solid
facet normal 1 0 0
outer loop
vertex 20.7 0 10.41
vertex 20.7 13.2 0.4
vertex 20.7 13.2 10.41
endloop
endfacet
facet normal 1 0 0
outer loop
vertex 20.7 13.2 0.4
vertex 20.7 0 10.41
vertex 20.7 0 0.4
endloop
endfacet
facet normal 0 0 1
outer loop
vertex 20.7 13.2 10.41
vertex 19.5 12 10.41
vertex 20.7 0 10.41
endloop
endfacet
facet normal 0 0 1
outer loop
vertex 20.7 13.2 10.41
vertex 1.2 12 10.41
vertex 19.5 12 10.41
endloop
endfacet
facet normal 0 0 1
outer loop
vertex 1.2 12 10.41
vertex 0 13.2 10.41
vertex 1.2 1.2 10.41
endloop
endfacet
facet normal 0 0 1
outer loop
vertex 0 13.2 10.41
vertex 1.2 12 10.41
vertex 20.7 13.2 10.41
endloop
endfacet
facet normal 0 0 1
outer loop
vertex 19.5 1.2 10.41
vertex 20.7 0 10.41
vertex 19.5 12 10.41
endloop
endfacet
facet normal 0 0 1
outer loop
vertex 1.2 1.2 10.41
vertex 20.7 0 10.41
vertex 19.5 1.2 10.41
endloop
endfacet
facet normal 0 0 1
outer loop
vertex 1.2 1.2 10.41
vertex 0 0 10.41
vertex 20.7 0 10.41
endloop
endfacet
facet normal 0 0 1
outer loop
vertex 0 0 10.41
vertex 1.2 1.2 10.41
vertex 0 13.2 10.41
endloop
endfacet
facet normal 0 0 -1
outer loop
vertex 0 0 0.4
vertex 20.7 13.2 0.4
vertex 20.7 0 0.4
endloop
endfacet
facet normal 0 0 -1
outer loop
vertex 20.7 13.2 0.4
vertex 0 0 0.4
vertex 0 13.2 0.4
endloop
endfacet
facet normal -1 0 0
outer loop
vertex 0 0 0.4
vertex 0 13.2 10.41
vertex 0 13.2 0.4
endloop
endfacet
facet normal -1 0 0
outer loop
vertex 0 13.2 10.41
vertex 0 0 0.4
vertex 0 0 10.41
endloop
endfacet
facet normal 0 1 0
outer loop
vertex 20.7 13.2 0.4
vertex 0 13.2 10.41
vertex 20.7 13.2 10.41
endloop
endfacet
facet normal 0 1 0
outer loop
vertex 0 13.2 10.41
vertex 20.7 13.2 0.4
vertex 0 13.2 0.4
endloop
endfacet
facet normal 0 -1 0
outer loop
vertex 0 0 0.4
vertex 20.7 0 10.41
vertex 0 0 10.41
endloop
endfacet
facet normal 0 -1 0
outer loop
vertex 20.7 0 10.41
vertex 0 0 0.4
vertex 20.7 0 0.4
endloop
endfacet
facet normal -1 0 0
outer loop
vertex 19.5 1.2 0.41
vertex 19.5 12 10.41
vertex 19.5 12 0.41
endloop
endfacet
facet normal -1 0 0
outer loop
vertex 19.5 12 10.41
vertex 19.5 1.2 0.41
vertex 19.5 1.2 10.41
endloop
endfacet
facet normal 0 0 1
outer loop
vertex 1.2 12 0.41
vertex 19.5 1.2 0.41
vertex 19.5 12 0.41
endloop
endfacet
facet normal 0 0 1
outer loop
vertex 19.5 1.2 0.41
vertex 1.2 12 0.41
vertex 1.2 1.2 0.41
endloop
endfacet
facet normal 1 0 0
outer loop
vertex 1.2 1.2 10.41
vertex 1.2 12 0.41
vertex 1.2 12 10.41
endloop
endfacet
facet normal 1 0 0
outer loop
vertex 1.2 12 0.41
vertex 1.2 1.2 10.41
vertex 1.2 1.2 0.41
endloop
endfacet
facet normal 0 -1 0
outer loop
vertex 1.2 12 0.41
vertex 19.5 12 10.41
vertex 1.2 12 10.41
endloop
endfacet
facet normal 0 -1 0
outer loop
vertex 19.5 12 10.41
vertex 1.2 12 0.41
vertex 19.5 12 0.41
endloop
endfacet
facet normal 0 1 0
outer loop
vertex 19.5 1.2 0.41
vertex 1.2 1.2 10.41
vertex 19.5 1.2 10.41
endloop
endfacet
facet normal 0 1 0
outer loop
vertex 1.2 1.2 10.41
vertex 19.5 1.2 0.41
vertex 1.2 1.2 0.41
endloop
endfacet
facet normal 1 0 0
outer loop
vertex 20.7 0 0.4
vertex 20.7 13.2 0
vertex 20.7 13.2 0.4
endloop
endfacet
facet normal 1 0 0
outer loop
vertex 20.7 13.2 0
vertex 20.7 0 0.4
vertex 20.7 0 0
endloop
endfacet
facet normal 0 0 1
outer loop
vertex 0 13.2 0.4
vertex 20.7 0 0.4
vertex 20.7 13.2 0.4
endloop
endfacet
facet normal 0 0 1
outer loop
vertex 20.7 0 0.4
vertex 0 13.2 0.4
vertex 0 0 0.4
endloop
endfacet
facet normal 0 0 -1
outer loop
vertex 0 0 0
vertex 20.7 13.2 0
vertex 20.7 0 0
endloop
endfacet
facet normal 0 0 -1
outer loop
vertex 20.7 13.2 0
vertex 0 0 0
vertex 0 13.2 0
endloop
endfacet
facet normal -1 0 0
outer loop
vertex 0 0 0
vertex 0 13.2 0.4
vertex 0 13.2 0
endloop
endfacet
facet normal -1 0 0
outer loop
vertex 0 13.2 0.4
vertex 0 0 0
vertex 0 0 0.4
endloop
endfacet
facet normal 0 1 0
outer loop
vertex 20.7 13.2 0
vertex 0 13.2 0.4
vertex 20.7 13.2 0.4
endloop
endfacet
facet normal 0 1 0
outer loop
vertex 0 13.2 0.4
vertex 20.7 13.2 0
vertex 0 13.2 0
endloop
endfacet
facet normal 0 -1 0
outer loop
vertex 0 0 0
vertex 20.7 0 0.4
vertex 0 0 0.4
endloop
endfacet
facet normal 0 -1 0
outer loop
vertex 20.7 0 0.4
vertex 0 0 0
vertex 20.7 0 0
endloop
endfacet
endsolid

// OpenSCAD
// file: ../../Base/Boxes.scad
// Fischertechnik Box Foundation
// Pre-designed Boxes

use <Constants.scad>

include <PlacementOptions.scad>

box190Width = 190;
box190Depth = 130;
box130Width = 130;
box130Depth = 95;
boxUsageHeight = 33.9;
boxWallThickness = 2.4;
boxBaseThickness = 1.0;
boxWebWidth = 3.0;

// getBoxWallThickness()
// Gets the wall thickness of a Fischertechnik Box

function getBoxWallThickness() = boxWallThickness;

// Gets the usable height of a fischertechnik box
function getBoxUsageHeight() = boxUsageHeight;

// Gets the thickness of the Fischertechnik box base.
function getBoxBaseThickness() = boxBaseThickness;

// Gets the width of a box web
function getBoxWebWidth() = boxWebWidth;

// Gets the usable inner space of a Box 190 as an x/y-list
function getBox190Space() = [
    box190Width - 2*getBoxWallThickness(), 
    box190Depth - 2*getBoxWallThickness() ];

// Imports the Fischertechnik empty box 130x190 mm and places it at position 0,0
// 190x130 are the outer sizes, the inner space is slightly smaller. Use getBox190Space() to get the inner sizes.
// This module needs the STL file "Fischertechnik Box 130x190.stl" in the library path.
// The box is positioned that the usable inner space is at the 0,0,0 position. The

module Box190() {
    translate([-getBoxWallThickness(),-getBoxWallThickness(),-getBoxBaseThickness()])
        import("Fischertechnik Box 130x190.stl", convexity=3);
}

// Gets the usable inner space of a Box 130 as an x/y-list
function getBox130Space() = [
    box130Width - 2*getBoxWallThickness(), 
    box130Depth - 2*getBoxWallThickness() ];

// Imports the Fischertechnik empty box 95x130 mm and places it at position 0,0
// 190x130 are the outer sizes, the inner space is slightly smaller. Use getBox190Space() to get the inner sizes.
// This module needs the STL file "Fischertechnik Box 95x130.stl" in the library path.
// The box is positioned that the usable inner space is at the 0,0,0 position. The

module Box130() {
    translate([-getBoxWallThickness(),-getBoxWallThickness(),-getBoxBaseThickness()])
        import("Fischertechnik Box 95x130.stl", convexity=3);
}

// Creates a web at the specified box walls
// corner 0 = LowerLeft, 1 = UpperLeft, 2 = UpperRight, 3 = LowerRight
// side 0 = LeftOfCorner, 1 = RightOfCorner
// distance = Distance in mm from the corner
// box = inner width and depth of the box (default: Box 190)
// webWidth = length of the web (default is 3 mms)
// webThickness = thickness of the web (default is 1 mm)

module BoxWeb(corner, side, distance, box=getBox190Space(), webWidth=getBoxWebWidth(), webThickness=1.0) {
    sink = getBoxWallThickness()/2;

    width = (corner % 2 == 0) ? 
            (side == LeftOfCorner ? webWidth : webThickness) :
            (side == LeftOfCorner ? webThickness : webWidth);

    depth = (corner % 2 == 0) ? 
            (side == RightOfCorner ? webWidth : webThickness) :
            (side == RightOfCorner ? webThickness : webWidth);
    
    xDiff = corner == LowerLeft ? 
                (side == LeftOfCorner ? -sink : distance) :
            (corner == UpperLeft ?                
                (side == LeftOfCorner ? distance : -sink) :
            (corner == UpperRight ?
                (side == LeftOfCorner ? box.x-webWidth+sink : box.x-distance-webThickness) :
                (side == LeftOfCorner ? box.x-distance-webThickness: box.x-webWidth+sink)));

    yDiff = corner == LowerLeft ? 
                (side == RightOfCorner ? -sink : distance) :
            (corner == UpperLeft ?
                (side == RightOfCorner ? box.y-distance : box.y-webWidth+sink) :
            (corner == UpperRight ?
                (side == RightOfCorner ? box.y-webWidth+sink : box.y-distance) :
                (side == RightOfCorner ? distance : -sink)));
    
    translate([xDiff, yDiff, -getExcess()])
        cube([width, depth, boxUsageHeight + 2*getExcess()]);
}
// file: ../../Base/Rotation.scad
// Fischertechnik Box Foundation
// Geometry Helpers Rotation

include <PlacementOptions.scad>

// getRotatedSpace(space, rotation=NoRotation)
// Rotates the space dependent on the specified rotation

function getRotatedSpace(space, rotation=NoRotation) = [
    (rotation == Rotate90 || rotation == Rotate270) ? space.y : space.x,
    (rotation == Rotate90 || rotation == Rotate270) ? space.x : space.y
];

// Rotates the given space around the fixed left lower corner
// space = the space the children needs as width/depth list [width,depth]
// rotation = 0 Rotate0 degrees, 1 Rotate90 degrees, 2 Rotate180 degrees, 3 Rotate270 degrees (equivalent to -90)

module RotateFix(space, rotation=Rotate0) {
    dy = (rotation == Rotate0 || rotation == Rotate270) ? 0 :
        (rotation == Rotate90) ? space.x :
        space.y;
    dx = (rotation < Rotate180) ? 0 :
        (rotation == Rotate180) ? space.x :
        space.y;
    
    translate([dx, dy, 0])
        rotate([0, 0, rotations[rotation]])
            children();
}
// file: ../../Base/Alignment.scad
// Fischertechnik Box Foundation
// Geometry Helpers Alignment

include <PlacementOptions.scad>

// getAlignedX(elementWidth, spaceWidth, align=AlignRight, offset=0)
// Gets the aligned X offset of an element with the given
// width in the given space.
// elementWidth = The width of the element to positon
// spaceWidth = The space where the element should be aligned
// align = 0 AlignLeft, 1 AlignCenter, 2 AlignRight
// offset = an optional offset from the aligned position. When
// aligned left or centered, then positive values are in X direction.
// When aligned right then positive values are in negative X direction.

function getAlignedX(elementWidth, spaceWidth, align=AlignRight, offset=0) =
    (align == AlignLeft) ?
        offset :
        ((align == AlignCenter) ?
        (spaceWidth - elementWidth)/2 + offset :
        spaceWidth - offset - elementWidth);

// getAlignedY(elementDepth, spaceDepth, align=AlignTop, offset=0)
// Gets the aligned Y offset of an element with the given
// depth in the given space.
// elementDepth = The depth of the element to positon
// spaceDepth = The space where the element should be aligned
// align = 0 AlignBottom, 1 AlignCenter, 2 AlignTop
// offset = an optional offset from the aligned position. When
// aligned bottom or centered, then positive values are in Y direction.
// When aligned top then positive values are in negative Y direction.

function getAlignedY(elementDepth, spaceDepth, align=AlignTop, offset=0) =
    (align == AlignBottom) ?
        offset :
        ((align == AlignCenter) ?
        (spaceDepth - elementDepth)/2 + offset :
        spaceDepth - offset - elementDepth);
// file: ../../Base/PlacementOptions.scad
// Fischertechnik Box Foundation
// Placement Options

// Alignment
NoAlign = 0;
AlignLeft = 1;
AlignBottom = 2;
AlignCenter = 3;
AlignRight = 4;
AlignTop = 5;

// Element rotation degree steps
rotations = [0, -90, -180, -270];

// Rotation
NoRotation = 0;
Rotate0 = 0;
Rotate90 = 1;
Rotate180 = 2;
Rotate270 = 3;

// Docking (seen from above)
NoDock = -1;
DockLeft = 0;
DockTop = 1;
DockRight = 2;
DockCorner = 2;
DockBottom = 3;

// Web corners
LowerLeft = 0;
UpperLeft = 1;
UpperRight = 2;
LowerRight = 3;

// Web position relative to corner
LeftOfCorner = 0;
RightOfCorner = 1;
// file: ../../Base/Placement.scad
// Fischertechnik Box Foundation
// Geometry Helpers Placement

use <Constants.scad>
use <Alignment.scad>
use <Rotation.scad>
use <Boxes.scad>

include <PlacementOptions.scad>

// Place(x=0, y=0, elementSpace=[0,0], alignX=AlignLeft, alignY=AlignBottom, rotation=Rotate0, boxSpace=getBox190Space())
// Places the child at the specified position
// y = Y-Position. This is a relative position when an X aligment is specified.
// x = X-Position. This is a relative position when an Y aligment is specified.
// elementSpace = space of the element to be placed [x,y]
// alignX = -1=NoAlign, 0 AlignLeft, 1 AlignCenter, 3 AlignRight (elementSpace and boxSpace required!)
// alignY = -1=NoAlign, 2 AlignBottom, 1 AlignCenter, 4 AlignTop (elementSpace and boxSpace required!)
// rotation = 0 Rotate0 0 degrees, 1 Rotate90 90 degrees, 
// 2 Rotate180 180 degrees, 3 Rotate270 270 degrees (equivalent to -90)
// boxSpace = Inner space of the box where the placement occurs [x,y] - default is Box 190x130 inner space

module Place(x=0, y=0, elementSpace=[0,0], 
  alignX=AlignLeft, alignY=AlignBottom, 
  rotation=NoRotation, boxSpace=getBox190Space()) {

    module Position(x, y, space, rotation=Rotate0) {
        translate([x, y, 0])
            RotateFix(space, rotation)
                children();
    }

    space = getRotatedSpace(elementSpace, rotation);
    alignedX = getAlignedX(space.x, boxSpace.x, alignX, x);
    alignedY = getAlignedY(space.y, boxSpace.y, alignY, y);
    Position(alignedX, alignedY, elementSpace, rotation)
        children();
}

// Center(space=getBox130Space(), elementSpace=[0,0])
// space = Space where the children is centered. For cylinder use centered=true and no elementSpace.
// elementSpace = space of the element to be centered [x,y]

module Center(space=getBox190Space(), elementSpace=[0,0]) {
    translate([(space.x - elementSpace.x) / 2, (space.y - elementSpace.y) / 2])
        children(0);
}

// CenterHorizontal(width=0, y=0, offset=0, space=getBox130Space())
// space = Space where the children is centered. For cylinder use centered=true and no elementSpace.
// elementSpace = space of the element to be centered [x,y]

module CenterHorizontal(width=0, y=0, offset=0, space=getBox190Space()) {
    translate([(space.x - width) / 2 + offset, y])
        children(0);
}

// CenterVertical(depth=0, x=0, offset=0, space=getBox130Space())
// space = Space where the children is centered. For cylinder use centered=true and no elementSpace.
// elementSpace = space of the element to be centered [x,y]

module CenterVertical(depth=0, x=0, offset=0, space=getBox190Space()) {
    translate([x, (space.y - depth) / 2 + offset])
        children(0);
}
// file: ../../Elements/AxisClip10.scad
// Fischertechnik Box Library
// Axis for clip 10
// 31023

use <../ModelBase/Simple.scad>

width = 12;
depth = 12;
height = 23;

// getAxisClip10Space()
// Gets the space of a frame for a clip 10 with spring ring (mot2)

function getAxisClip10Space() = [width, depth, height];

// AxisClip10()
// Axis for clip 10 with spring ring (mot2)

module AxisClip10() {
    LeveledAxisWithSpace(height, height-10, getAxisClip10Space());
}

// Tests
color("lightgray")
AxisClip10();
// file: ../../Base/Constants.scad
// Fischertechnik Box Foundation
// Constants

// Constant values necessary for multiple elements

// Base constants
dividerThickness = 1.2;
excess = 0.01;
fragments = 90;
tolerance = 0.8;

// Gets the thickness of a divider 
function getDividerThickness() = dividerThickness;

// Gets the excess that is used to merge walls into each other
function getExcess() = excess;

// Gets amount of fragments of a cylinder
function getFragments() = fragments;

// Gets the inner tolerance of a frame to each side
function getTolerance() = tolerance;


// Fischertechnik specific constants
axisDiameter = 4;
axisBottomDiameter = axisDiameter + 1;
standardEdgeDistance = 2.5;
standardWebDistance = 11.5;
standardCornerLength = 15;
tubeWallFactor = 0.8;

// Gets axis diameter
function getAxisDiameter() = axisDiameter;

// Gets axis bottom diameter for thicker part at the bottom
function getAxisBottomDiameter() = axisBottomDiameter;

// gets the standard distance to the wall of the box for dockable frames with webs
function getStandardEdgeDistance() = standardEdgeDistance;

// gets the standard distance of each web to the corner of the dockable frame
function getStandardWebDistance() = standardWebDistance;

// gets the standard length of the corner walls of a dockable frame
function getStandardCornerLength() = standardCornerLength;

// gets the wall thickness of a tube.
function getTubeWallThickness() = tubeWallFactor * getDividerThickness();
// file: ../../Elements/FrameAngleBlock10x15x15.scad
// Fischertechnik Box Library
// Frame for Angle Block 10x15x15
// 38423

use <../Base/Constants.scad>
use <../ModelBase/Simple.scad>

width = 17.5;
depth = 10;

// getFrameAngleBlock10x15x15Space
// Gets the space the count of frame angle blocks needs as width and depth (.x and .y as a list)

function getFrameAngleBlock10x15x15Space(count=1) = [
    width + getTolerance() + 2*getDividerThickness(), 
    (depth + getTolerance())*count + (count+1)*getDividerThickness()];

// FrameAngleBlock10x15x15()
// Frame for angle block 10x15x15
// 38423

module FrameAngleBlock10x15x15(count=1) {
    height = 10;
    
    step = getFrameAngleBlock10x15x15Space().y - getDividerThickness();
    end = (count-1) * step;
    
    for (yOffset = [0:step:end])
        translate([0, yOffset, 0])
            Frame([width, depth, height]);
}

// Test
color("lightgray")
FrameAngleBlock10x15x15();
// file: ../TestPrint.scad
// 3D Print Test Base

use <../Base/Constants.scad>

use <../Elements/AxisClip10.scad>

module TestPrint(elementSpace) {
    cube([elementSpace.x, elementSpace.y, 0.4]);
    translate([0,0,0.4+getExcess()]) {
        children();
    }
}

TestPrint(getAxisClip10Space())
    AxisClip10();
// main file
// 3D Print Test
// FrameAngleBlock10x15x15

use <../TestPrint.scad>
use <../../Elements/FrameAngleBlock10x15x15.scad>

TestPrint(getFrameAngleBlock10x15x15Space())
    FrameAngleBlock10x15x15();
